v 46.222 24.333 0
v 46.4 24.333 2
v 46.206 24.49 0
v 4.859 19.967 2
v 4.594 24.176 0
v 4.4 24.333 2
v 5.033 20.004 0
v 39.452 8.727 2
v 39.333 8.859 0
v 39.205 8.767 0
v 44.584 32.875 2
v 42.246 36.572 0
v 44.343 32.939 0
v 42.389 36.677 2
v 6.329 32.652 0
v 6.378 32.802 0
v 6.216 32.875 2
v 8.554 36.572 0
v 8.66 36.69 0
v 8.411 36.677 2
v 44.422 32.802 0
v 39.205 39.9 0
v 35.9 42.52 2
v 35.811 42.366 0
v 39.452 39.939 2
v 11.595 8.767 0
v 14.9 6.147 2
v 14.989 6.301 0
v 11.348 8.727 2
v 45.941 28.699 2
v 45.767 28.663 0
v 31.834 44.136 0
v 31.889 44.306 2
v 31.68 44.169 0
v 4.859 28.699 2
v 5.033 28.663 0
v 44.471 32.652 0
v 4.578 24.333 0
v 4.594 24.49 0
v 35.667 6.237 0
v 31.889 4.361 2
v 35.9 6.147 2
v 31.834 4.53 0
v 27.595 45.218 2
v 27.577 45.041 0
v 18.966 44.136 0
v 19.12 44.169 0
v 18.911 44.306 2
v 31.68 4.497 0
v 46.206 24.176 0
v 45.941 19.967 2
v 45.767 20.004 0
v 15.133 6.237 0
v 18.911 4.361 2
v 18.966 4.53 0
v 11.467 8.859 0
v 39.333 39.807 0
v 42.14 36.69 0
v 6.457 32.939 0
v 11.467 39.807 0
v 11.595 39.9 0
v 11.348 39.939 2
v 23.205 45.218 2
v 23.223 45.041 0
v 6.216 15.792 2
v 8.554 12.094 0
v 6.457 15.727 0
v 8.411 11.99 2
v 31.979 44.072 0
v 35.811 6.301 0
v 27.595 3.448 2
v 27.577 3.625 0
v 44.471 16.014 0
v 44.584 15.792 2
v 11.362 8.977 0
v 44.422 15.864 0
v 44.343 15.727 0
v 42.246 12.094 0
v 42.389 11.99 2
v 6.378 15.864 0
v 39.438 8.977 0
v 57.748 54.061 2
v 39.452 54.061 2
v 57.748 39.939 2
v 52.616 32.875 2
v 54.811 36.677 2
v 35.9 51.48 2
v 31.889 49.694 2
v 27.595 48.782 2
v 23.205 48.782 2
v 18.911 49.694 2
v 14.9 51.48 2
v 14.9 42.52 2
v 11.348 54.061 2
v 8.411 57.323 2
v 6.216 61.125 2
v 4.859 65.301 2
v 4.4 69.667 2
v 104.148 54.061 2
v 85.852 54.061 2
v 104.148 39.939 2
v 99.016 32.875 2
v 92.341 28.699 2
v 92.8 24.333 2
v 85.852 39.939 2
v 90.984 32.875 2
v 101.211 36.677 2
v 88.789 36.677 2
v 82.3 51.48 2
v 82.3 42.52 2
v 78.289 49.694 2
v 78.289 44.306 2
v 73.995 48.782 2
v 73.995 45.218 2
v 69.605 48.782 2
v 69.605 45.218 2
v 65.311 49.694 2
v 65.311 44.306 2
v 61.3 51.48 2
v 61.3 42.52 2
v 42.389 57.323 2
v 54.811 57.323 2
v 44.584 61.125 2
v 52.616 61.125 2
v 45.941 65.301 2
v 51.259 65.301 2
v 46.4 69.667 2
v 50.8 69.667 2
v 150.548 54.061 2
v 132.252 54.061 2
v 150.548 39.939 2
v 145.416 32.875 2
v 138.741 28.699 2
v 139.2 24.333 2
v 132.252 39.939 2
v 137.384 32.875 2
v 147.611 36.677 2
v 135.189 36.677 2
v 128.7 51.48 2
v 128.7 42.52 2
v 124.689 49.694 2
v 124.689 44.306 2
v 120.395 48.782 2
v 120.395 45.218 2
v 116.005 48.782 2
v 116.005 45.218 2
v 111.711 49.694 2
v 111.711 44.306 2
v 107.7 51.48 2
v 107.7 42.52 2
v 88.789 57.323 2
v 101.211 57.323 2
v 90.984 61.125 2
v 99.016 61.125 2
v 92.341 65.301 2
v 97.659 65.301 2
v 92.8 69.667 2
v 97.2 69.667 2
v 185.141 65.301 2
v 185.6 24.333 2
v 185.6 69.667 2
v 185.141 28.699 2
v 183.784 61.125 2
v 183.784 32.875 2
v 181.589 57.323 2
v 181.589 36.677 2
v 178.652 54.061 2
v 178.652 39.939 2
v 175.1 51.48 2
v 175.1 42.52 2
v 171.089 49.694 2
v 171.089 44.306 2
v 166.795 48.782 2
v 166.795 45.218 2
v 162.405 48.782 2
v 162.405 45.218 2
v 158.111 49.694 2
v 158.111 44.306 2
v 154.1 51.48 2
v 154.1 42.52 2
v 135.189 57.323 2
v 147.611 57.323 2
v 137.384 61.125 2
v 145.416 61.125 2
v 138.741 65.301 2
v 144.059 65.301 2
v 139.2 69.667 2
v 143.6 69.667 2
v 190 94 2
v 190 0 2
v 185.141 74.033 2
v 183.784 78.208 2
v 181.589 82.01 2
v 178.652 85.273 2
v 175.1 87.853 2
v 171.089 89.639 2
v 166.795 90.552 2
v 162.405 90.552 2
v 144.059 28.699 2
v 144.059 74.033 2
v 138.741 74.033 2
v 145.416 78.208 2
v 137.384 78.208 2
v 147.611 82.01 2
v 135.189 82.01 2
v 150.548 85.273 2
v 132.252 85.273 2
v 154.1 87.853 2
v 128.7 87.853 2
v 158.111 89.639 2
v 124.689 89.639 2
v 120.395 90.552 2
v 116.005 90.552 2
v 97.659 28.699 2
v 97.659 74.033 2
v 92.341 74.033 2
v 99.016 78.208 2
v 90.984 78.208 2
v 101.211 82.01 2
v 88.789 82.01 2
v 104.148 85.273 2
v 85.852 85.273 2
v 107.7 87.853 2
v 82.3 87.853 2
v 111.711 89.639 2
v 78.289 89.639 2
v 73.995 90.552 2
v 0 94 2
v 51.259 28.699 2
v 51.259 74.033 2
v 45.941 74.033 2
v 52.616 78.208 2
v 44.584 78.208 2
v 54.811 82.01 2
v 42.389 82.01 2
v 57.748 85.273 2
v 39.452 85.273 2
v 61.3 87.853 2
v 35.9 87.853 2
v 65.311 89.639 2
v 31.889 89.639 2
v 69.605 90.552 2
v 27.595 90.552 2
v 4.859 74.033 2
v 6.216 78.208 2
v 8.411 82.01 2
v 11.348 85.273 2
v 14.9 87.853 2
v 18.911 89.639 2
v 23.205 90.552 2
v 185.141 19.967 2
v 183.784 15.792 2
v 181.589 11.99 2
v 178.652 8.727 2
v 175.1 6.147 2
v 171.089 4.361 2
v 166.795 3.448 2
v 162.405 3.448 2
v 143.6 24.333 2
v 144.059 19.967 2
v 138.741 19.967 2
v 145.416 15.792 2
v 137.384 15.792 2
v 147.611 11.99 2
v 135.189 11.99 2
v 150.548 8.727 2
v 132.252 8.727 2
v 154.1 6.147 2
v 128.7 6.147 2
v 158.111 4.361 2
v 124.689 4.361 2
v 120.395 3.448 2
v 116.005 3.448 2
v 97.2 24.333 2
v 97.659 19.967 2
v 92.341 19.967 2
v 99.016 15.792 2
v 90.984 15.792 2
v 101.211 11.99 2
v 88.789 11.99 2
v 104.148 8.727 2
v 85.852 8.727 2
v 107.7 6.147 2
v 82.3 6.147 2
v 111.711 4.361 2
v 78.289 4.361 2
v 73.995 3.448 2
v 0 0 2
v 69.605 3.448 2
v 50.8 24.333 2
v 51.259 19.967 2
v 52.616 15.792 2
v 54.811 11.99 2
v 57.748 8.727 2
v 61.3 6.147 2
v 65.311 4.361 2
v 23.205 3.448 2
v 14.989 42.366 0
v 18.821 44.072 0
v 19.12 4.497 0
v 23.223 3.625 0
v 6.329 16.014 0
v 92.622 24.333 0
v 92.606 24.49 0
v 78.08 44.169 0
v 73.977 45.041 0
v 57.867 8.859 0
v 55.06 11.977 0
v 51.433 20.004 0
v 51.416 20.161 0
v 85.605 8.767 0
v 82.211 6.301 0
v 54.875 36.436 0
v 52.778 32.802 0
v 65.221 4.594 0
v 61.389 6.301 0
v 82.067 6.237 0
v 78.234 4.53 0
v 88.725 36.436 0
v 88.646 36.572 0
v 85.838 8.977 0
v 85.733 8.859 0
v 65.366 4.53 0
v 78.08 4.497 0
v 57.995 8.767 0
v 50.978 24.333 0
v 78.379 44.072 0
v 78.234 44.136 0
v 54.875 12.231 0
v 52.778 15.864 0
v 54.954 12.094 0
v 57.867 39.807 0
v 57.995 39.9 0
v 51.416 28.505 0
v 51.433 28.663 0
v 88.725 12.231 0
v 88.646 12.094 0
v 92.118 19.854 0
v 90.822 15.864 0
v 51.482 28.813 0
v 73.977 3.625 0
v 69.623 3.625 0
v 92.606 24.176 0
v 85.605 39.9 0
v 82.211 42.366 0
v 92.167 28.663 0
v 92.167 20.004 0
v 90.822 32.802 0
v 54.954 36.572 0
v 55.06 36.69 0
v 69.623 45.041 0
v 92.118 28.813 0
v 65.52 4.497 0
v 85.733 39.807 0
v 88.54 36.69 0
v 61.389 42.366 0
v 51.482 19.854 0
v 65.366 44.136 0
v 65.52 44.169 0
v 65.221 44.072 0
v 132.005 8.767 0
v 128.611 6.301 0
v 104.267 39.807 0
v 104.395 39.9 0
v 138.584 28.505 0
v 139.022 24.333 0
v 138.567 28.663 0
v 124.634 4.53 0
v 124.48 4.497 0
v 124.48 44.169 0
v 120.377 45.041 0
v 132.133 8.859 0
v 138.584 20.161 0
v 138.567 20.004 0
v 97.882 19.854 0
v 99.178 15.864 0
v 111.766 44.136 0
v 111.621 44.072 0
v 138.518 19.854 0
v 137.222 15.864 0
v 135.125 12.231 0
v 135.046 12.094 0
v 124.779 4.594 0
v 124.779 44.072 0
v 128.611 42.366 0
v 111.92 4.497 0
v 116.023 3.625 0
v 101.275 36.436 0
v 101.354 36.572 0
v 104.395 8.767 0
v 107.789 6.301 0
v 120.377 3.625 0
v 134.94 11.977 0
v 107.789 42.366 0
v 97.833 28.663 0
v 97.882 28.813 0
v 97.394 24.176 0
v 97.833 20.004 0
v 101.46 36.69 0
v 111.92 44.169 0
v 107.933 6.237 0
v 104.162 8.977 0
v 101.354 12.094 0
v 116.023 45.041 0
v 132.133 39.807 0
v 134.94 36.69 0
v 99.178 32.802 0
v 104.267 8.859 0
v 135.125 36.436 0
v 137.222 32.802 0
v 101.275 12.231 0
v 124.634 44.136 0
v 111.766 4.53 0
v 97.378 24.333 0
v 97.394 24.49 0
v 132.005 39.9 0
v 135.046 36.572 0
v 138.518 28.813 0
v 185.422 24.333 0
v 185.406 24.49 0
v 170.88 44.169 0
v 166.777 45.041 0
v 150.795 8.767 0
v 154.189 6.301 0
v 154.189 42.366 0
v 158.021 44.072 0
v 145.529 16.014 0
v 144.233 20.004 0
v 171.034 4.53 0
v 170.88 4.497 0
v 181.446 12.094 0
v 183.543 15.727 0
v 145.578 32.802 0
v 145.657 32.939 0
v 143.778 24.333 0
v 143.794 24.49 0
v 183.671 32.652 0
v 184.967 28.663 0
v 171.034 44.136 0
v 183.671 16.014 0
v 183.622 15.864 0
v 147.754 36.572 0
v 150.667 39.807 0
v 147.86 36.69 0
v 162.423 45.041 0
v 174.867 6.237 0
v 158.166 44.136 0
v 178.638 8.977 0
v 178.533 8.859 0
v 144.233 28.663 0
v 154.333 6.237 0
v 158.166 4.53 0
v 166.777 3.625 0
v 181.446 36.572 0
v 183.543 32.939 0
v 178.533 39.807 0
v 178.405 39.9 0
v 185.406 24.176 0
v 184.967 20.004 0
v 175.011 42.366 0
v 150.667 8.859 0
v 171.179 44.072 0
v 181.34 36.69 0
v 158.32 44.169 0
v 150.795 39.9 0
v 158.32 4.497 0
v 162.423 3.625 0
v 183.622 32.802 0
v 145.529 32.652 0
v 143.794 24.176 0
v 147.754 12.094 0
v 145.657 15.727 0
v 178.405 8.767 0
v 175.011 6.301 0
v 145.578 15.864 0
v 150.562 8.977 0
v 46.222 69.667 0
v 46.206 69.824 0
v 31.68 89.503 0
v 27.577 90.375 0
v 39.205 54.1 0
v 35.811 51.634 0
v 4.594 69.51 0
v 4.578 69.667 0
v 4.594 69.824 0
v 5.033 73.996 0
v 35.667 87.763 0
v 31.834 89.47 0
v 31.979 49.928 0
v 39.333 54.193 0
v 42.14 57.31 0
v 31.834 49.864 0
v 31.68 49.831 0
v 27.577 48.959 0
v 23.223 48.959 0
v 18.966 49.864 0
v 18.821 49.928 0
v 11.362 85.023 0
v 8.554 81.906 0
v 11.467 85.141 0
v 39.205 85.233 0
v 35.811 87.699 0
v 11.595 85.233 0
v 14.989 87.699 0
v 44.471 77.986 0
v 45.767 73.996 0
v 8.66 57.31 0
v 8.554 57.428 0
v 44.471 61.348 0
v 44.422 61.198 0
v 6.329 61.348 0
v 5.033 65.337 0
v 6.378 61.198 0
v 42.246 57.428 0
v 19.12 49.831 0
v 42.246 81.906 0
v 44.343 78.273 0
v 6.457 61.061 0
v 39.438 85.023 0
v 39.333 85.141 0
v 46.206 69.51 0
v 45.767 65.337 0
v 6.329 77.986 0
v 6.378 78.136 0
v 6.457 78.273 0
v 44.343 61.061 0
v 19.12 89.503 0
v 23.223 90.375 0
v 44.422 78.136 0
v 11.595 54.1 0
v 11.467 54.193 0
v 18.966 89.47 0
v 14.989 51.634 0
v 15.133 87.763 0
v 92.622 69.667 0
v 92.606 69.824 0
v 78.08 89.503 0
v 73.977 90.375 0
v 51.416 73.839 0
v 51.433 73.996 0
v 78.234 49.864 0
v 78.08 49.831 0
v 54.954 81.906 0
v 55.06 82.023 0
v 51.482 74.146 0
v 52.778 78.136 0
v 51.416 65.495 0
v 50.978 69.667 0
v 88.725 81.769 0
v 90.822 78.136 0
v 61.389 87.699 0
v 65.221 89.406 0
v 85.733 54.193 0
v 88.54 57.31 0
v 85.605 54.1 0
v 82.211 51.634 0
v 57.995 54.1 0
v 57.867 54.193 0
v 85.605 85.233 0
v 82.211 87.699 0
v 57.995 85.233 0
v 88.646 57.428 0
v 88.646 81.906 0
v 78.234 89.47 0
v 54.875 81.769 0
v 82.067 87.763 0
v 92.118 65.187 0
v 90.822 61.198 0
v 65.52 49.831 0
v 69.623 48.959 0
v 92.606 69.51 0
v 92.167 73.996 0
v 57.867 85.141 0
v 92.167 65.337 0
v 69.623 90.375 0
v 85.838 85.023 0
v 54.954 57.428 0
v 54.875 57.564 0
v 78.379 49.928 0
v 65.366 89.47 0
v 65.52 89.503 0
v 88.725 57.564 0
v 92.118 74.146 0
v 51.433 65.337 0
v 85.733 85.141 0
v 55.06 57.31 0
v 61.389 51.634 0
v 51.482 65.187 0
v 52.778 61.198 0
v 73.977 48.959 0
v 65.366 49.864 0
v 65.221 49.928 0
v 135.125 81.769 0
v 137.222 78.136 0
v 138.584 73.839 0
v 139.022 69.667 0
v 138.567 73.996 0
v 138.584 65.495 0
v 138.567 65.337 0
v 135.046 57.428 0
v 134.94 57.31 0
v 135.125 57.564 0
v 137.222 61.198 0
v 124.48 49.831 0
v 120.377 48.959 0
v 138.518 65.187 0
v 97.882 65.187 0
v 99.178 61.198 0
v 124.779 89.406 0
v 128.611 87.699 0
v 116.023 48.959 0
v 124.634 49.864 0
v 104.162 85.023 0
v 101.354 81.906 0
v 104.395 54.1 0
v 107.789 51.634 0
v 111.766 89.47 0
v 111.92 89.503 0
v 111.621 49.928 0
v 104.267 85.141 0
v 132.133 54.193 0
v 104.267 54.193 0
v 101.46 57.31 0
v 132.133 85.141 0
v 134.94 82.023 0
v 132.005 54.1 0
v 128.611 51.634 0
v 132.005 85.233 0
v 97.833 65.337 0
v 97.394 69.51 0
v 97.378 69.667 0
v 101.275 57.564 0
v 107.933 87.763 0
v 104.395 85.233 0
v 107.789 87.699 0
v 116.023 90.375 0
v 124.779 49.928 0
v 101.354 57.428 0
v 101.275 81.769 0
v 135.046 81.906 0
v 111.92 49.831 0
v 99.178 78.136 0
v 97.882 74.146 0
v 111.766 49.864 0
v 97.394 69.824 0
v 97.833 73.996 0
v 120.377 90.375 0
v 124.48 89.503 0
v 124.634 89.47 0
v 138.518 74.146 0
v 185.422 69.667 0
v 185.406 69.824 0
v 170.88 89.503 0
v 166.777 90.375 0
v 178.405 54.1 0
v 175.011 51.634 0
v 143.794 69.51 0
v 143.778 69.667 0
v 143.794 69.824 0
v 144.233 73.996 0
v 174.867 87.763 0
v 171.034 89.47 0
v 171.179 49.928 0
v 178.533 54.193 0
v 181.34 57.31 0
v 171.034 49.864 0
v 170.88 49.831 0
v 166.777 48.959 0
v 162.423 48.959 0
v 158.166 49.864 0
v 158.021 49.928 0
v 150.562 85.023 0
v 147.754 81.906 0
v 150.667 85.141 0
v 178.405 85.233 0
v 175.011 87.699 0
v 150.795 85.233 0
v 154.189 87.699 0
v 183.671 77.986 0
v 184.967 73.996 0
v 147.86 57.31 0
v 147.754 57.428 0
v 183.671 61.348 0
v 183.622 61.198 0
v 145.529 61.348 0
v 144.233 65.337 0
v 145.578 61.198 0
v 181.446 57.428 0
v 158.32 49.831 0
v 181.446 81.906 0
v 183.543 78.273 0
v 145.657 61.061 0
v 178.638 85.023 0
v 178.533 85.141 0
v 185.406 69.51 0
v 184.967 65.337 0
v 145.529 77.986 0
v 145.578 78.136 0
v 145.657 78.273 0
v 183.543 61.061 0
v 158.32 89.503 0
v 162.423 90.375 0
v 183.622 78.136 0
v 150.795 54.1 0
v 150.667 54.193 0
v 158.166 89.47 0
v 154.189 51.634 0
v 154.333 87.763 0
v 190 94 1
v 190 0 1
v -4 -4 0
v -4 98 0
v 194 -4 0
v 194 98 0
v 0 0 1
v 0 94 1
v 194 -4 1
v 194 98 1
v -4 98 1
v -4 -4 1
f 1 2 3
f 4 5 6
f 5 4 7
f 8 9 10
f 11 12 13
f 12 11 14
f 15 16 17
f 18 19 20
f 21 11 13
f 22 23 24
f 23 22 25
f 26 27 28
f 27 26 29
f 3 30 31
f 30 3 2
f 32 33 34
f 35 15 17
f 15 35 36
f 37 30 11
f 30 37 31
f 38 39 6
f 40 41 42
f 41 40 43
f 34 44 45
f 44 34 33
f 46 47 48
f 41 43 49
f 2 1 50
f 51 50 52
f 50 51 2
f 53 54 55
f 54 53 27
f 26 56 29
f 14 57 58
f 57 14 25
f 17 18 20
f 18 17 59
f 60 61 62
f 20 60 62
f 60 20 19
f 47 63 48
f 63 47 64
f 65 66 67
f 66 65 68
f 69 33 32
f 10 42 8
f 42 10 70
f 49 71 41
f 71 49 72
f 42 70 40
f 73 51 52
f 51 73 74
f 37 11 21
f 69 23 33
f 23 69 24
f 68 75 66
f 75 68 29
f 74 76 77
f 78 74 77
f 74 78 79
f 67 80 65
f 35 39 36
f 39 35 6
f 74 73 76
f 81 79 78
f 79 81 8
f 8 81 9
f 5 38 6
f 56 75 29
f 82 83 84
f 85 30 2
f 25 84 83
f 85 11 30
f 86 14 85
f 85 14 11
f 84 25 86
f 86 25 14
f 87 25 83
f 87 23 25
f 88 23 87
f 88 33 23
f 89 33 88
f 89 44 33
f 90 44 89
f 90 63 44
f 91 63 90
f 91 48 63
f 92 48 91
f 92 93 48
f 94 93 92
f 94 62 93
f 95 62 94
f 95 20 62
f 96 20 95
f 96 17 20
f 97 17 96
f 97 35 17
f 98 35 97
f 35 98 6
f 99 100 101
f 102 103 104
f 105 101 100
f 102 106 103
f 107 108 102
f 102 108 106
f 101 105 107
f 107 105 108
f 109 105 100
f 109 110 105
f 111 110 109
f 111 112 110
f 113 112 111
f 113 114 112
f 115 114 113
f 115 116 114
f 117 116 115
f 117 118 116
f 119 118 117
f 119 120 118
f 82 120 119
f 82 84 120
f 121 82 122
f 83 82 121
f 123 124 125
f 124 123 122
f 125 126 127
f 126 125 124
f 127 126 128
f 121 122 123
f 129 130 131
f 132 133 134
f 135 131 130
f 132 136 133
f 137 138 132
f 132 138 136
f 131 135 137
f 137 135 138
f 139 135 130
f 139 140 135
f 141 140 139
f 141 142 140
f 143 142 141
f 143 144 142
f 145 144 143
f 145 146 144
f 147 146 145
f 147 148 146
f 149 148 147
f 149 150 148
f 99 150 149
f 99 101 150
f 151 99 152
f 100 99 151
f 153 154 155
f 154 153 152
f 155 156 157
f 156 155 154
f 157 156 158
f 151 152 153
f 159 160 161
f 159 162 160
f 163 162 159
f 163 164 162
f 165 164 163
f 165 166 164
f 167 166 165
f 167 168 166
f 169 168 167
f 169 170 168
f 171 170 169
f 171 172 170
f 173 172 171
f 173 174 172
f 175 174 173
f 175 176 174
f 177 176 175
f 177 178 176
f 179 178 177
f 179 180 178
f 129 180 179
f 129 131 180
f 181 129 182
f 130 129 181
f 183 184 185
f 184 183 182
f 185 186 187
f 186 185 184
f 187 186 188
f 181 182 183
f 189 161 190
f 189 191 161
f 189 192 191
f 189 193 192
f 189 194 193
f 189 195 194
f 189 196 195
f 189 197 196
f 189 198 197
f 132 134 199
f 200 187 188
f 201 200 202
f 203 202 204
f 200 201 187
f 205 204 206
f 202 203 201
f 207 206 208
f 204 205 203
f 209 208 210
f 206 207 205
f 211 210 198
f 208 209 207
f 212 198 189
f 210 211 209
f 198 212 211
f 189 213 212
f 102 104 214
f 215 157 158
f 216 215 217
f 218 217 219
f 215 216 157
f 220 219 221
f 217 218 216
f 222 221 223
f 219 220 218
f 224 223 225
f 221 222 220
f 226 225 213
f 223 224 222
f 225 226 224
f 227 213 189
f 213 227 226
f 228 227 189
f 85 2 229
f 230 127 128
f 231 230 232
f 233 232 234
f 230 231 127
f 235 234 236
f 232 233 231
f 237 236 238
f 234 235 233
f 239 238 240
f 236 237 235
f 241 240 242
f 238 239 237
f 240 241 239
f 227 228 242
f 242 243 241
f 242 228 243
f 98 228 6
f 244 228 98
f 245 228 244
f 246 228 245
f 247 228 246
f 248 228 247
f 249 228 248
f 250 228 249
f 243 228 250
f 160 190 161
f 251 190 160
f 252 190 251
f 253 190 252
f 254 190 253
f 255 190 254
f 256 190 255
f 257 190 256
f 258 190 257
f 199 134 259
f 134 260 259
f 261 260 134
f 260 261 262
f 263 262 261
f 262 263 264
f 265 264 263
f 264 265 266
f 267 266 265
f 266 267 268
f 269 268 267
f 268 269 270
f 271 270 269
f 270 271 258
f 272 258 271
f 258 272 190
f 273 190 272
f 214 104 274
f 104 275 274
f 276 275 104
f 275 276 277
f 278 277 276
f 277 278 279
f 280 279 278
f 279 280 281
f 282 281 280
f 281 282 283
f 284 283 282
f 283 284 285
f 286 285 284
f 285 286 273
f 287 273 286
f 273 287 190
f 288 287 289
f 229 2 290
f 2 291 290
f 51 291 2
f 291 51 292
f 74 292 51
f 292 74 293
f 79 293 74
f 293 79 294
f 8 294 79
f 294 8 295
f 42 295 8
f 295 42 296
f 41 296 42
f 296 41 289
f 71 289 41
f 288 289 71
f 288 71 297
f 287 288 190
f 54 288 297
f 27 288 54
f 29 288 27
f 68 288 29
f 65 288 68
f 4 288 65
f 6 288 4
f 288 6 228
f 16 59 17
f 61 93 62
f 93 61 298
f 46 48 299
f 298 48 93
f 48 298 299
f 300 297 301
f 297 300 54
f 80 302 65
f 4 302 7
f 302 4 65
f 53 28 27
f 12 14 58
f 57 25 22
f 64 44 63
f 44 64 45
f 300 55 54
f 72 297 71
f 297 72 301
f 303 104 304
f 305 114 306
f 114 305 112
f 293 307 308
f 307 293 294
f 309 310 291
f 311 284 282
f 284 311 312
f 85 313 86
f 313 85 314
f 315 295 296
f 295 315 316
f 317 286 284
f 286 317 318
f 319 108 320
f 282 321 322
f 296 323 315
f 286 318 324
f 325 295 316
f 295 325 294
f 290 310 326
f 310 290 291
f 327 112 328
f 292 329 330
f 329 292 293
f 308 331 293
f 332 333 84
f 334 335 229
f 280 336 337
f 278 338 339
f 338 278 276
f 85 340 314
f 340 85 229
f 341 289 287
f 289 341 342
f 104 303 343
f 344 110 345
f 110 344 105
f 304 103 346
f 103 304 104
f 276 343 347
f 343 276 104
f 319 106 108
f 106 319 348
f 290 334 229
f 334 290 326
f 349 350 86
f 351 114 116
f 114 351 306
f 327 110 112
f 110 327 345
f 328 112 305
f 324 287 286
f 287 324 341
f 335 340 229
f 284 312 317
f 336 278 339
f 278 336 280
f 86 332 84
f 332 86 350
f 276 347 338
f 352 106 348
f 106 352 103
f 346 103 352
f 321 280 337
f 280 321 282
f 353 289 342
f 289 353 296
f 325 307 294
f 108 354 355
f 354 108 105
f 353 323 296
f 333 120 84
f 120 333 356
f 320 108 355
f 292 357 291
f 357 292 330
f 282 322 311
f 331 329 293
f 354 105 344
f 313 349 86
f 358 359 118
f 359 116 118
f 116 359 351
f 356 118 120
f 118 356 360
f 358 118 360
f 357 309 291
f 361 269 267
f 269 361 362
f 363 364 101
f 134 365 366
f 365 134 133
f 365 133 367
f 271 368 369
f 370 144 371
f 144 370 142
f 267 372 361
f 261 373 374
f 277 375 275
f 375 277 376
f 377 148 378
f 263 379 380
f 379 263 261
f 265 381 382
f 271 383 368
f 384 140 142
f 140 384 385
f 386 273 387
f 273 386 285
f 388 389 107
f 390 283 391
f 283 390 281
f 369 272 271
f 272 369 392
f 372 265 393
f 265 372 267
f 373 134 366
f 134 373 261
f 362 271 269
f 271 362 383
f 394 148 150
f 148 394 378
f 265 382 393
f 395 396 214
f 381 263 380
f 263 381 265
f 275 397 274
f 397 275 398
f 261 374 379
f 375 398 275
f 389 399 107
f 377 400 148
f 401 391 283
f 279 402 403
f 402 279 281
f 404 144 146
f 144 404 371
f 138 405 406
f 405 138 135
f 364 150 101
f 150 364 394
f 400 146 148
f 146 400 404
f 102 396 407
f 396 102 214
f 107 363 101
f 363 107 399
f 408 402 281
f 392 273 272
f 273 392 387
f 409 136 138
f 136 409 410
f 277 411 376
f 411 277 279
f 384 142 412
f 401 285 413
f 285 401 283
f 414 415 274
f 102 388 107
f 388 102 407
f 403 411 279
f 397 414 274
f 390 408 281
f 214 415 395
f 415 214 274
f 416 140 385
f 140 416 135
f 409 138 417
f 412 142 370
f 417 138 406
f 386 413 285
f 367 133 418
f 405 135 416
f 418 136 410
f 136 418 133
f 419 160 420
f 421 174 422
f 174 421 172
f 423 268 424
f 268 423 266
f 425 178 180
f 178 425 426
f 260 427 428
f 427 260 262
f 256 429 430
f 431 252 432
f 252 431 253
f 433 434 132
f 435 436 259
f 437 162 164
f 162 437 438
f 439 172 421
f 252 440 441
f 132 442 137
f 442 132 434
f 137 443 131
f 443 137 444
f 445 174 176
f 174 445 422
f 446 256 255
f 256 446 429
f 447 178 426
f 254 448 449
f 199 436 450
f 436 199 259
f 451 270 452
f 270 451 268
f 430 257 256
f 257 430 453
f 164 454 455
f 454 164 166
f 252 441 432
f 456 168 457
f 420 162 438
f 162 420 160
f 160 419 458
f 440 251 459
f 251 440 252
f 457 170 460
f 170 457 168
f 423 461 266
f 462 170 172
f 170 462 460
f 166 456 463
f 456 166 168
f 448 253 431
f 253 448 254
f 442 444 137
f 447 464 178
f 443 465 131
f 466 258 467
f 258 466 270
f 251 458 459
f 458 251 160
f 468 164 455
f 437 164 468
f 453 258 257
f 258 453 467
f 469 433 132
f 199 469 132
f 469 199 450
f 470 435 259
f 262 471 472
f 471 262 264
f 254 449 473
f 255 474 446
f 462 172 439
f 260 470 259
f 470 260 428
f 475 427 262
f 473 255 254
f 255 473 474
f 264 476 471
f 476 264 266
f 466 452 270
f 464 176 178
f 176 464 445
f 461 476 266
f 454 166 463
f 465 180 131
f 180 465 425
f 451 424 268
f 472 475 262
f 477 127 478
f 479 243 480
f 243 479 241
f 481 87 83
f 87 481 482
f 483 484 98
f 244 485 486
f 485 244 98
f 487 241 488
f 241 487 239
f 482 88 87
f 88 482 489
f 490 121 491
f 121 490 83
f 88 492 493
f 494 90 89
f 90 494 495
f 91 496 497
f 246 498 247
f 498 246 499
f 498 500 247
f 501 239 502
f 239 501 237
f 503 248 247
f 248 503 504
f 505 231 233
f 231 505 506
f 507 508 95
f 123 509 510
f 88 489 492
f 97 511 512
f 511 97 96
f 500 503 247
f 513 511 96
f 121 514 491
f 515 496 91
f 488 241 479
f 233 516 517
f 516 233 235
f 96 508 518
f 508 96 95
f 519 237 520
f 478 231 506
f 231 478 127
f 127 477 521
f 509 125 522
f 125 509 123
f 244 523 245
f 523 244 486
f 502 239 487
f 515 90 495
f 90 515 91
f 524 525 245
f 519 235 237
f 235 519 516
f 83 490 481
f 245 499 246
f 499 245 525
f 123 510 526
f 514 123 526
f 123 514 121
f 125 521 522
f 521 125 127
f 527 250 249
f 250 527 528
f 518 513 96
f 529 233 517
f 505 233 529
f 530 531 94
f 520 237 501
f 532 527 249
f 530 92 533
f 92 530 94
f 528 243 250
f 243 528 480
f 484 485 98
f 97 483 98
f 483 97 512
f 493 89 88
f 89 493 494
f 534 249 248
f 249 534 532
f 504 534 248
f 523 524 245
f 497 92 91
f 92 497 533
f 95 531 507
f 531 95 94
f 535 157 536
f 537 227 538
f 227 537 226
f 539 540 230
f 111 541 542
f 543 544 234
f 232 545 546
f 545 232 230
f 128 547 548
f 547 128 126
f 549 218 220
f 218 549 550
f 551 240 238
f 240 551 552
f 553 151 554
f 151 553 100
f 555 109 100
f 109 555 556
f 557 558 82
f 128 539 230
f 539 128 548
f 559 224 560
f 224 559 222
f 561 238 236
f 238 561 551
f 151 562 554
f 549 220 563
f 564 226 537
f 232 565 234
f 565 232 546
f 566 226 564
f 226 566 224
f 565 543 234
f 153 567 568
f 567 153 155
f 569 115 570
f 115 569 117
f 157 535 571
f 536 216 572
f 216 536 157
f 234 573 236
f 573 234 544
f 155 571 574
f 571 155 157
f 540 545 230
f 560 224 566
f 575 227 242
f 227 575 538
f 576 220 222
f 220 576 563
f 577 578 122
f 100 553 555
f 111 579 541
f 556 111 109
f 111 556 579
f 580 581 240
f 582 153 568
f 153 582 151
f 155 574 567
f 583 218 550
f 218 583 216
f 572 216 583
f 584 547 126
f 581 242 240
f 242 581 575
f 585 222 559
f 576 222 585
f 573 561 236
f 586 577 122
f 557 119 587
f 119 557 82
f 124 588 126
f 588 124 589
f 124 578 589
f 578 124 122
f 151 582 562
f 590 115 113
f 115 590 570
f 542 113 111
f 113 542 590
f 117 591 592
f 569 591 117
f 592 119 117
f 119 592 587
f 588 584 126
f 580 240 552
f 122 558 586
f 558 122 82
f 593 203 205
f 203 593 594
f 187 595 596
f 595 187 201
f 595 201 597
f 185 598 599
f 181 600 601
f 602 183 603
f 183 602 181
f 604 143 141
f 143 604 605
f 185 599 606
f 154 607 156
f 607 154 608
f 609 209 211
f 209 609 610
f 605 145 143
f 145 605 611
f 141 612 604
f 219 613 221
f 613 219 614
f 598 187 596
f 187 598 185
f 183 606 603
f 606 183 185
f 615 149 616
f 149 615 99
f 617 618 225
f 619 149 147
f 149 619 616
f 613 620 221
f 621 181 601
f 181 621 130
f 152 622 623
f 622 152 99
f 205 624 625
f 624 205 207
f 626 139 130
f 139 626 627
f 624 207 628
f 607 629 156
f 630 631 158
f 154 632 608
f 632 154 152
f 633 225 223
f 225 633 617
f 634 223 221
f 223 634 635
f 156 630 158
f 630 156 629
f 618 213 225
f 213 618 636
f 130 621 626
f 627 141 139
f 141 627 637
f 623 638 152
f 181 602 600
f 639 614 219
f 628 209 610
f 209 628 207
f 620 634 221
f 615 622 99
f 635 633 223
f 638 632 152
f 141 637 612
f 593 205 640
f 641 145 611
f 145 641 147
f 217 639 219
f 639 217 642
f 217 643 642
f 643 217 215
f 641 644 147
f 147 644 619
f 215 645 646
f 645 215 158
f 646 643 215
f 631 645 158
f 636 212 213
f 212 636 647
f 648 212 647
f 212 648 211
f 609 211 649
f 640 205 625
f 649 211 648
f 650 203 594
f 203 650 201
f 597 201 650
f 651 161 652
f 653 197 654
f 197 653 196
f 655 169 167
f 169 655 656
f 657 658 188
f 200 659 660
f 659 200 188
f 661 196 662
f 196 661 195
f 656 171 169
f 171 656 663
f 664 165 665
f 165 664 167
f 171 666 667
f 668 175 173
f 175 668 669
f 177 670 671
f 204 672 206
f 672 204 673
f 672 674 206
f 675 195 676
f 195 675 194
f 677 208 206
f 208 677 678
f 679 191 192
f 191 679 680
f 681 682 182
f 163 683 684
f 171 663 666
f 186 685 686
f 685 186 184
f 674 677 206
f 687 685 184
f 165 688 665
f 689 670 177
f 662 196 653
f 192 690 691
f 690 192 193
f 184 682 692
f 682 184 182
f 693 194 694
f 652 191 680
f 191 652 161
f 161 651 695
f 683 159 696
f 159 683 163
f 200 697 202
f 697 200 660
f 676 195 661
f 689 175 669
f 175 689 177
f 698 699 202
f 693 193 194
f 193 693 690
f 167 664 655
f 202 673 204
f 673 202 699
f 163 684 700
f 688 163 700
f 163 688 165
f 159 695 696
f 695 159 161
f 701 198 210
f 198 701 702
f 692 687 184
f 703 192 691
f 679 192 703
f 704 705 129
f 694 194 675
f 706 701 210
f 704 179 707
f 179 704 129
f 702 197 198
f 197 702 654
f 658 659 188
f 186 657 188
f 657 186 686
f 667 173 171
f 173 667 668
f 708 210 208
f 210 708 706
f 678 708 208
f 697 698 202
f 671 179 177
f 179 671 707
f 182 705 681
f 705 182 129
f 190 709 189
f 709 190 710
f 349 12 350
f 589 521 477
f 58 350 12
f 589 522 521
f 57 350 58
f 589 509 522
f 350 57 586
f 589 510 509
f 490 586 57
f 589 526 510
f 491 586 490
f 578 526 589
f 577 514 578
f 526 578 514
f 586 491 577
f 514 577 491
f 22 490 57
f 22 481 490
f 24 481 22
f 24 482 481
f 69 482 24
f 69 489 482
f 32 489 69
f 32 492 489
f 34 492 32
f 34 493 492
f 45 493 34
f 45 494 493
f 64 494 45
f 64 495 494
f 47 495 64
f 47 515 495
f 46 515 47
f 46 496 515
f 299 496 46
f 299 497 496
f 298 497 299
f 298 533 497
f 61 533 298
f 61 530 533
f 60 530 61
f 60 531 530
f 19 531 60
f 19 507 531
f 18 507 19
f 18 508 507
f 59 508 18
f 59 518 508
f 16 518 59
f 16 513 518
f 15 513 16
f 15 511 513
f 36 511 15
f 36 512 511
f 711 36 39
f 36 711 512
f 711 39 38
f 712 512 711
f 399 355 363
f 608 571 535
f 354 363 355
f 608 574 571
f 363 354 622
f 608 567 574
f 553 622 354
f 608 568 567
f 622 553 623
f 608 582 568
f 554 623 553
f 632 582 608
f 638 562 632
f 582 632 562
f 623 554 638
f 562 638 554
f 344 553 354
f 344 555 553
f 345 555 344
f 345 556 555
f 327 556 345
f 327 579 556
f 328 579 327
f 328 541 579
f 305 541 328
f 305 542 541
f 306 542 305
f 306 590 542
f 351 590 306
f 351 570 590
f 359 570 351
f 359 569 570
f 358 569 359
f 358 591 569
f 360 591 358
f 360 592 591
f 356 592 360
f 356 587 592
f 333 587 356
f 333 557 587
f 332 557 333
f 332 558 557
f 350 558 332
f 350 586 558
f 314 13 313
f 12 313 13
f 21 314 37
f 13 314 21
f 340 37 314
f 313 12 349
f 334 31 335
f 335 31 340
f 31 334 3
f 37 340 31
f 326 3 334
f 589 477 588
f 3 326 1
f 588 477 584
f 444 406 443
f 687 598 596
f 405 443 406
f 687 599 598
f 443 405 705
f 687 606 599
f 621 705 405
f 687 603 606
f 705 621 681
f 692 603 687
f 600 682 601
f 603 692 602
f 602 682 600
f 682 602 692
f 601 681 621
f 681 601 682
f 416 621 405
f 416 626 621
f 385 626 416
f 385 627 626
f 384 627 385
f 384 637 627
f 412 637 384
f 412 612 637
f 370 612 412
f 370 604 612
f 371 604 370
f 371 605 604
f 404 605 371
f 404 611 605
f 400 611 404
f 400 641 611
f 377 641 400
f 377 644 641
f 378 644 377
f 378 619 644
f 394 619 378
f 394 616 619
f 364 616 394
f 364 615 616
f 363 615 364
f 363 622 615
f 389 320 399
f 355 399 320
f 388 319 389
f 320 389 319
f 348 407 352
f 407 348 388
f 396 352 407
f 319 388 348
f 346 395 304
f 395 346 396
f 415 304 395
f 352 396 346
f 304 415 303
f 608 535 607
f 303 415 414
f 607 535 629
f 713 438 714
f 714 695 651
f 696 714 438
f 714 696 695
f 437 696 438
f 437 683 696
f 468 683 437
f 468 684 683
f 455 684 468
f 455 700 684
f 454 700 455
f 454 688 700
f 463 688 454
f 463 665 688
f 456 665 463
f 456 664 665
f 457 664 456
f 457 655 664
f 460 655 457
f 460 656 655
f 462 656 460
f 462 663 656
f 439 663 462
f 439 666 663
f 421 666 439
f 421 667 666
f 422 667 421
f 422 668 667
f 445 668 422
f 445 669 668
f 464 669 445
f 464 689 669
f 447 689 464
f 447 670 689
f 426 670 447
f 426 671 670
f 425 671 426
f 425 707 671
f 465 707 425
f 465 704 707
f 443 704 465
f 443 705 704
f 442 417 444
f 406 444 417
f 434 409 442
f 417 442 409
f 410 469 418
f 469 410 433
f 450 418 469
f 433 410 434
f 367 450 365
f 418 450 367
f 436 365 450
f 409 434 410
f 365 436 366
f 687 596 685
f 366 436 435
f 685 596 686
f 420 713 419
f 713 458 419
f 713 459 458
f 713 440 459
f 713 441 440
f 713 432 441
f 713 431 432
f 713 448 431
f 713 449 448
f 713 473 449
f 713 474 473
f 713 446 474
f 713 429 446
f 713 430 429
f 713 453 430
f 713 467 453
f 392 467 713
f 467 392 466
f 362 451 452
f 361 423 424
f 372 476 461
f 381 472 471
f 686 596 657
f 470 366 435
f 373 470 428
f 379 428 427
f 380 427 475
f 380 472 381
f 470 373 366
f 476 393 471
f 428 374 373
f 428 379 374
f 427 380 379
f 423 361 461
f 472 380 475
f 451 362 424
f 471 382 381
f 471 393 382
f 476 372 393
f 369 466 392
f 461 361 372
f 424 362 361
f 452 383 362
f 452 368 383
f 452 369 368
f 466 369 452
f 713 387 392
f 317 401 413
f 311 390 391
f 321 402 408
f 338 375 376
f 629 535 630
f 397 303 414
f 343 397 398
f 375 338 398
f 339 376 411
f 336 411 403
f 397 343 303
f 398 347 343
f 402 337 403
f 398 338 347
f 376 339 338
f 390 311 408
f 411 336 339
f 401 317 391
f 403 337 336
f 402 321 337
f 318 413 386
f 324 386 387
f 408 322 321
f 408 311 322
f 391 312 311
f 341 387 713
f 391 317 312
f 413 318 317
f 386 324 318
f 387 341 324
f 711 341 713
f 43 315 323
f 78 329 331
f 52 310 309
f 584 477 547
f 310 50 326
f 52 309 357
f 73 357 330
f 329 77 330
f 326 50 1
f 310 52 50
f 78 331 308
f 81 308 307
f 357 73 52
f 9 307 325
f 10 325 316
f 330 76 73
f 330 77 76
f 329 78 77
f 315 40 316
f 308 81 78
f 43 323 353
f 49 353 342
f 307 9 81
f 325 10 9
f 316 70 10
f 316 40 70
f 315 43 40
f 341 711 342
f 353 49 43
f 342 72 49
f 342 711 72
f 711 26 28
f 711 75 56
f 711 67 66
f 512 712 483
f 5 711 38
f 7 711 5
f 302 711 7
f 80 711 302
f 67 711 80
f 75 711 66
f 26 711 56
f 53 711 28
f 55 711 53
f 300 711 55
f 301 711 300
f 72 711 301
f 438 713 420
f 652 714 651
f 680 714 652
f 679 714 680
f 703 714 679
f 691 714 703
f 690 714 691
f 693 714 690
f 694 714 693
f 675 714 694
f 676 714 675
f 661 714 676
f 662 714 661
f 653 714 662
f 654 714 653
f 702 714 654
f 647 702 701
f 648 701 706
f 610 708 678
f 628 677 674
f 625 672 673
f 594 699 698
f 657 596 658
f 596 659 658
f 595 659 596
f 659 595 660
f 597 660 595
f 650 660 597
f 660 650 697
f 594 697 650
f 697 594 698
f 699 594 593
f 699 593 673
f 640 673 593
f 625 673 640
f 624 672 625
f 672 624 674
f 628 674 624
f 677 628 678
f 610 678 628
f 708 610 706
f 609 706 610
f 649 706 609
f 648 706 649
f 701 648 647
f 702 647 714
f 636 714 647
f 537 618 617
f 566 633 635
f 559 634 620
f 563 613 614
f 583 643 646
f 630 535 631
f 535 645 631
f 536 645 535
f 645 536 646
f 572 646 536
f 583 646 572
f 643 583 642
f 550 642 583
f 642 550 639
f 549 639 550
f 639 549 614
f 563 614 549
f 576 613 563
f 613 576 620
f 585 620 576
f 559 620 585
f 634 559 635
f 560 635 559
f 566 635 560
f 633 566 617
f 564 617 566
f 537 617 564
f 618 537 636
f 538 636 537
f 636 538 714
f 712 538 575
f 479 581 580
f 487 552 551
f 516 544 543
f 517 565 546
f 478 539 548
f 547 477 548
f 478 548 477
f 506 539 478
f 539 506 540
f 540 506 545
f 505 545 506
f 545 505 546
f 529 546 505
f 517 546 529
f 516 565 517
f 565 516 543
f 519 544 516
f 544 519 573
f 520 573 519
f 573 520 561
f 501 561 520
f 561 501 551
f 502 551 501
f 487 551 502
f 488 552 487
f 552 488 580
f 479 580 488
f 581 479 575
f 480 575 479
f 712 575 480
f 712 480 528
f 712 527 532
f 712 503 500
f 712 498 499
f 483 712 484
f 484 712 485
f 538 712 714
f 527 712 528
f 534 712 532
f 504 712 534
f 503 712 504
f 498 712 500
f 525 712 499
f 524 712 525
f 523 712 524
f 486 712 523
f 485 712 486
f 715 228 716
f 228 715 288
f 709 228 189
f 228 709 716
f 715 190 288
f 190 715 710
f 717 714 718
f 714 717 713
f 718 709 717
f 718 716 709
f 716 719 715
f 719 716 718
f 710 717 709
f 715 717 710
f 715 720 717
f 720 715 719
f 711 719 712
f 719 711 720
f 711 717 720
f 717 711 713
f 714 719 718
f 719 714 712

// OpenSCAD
plate_width = 190;
plate_length = 94;
plate_height = 2;

plate_border = 4;
plate_border_height = 1;

cup_upper_diameter = 40;
cup_lower_diameter = 32;
cup_cutout_diameter = 17;
cup_height = 45;
cup_thickness = 2;
cup_rim_height = 2;
cup_rim_thickness = 1;

draw_plate();
//draw_cup();


module draw_plate() {
    rows = 2;
    cols = 4;
    x_spacing = (plate_width - cols * (cup_upper_diameter + cup_thickness)) / (cols + 1);
    y_spacing = (plate_length - rows * (cup_upper_diameter + cup_thickness)) / (rows + 1);
    difference() {
        cube([plate_width, plate_length, plate_height], false);
                
        for(row = [1:rows]) {
            for(col = [1:cols]) {
                x_offset = (cup_upper_diameter + cup_thickness + x_spacing) * col - (cup_upper_diameter + cup_thickness) / 2;
                y_offset = (cup_upper_diameter + cup_thickness + y_spacing) * row - (cup_upper_diameter + cup_thickness) / 2;
                
                translate([x_offset, y_offset, -cup_height + plate_height])
                    cylinder(d1 = cup_lower_diameter + cup_thickness, d2 = cup_upper_diameter + cup_thickness, h = cup_height);
            }
        }
        
    }
    
    // Draw border: B, T, L, R
    translate([-plate_border, -plate_border, 0])
        cube([plate_width + 2 * plate_border, plate_border, plate_border_height]);
    translate([-plate_border, plate_length, 0])
        cube([plate_width + 2 * plate_border, plate_border, plate_border_height]);
    translate([-plate_border, -plate_border, 0])
        cube([plate_border, plate_length + 2 * plate_border, plate_border_height]);
    translate([plate_width, -plate_border, 0])
        cube([plate_border, plate_length + 2 * plate_border, plate_border_height]);
}

module draw_cup() {
    difference() {
        cylinder(d1 = cup_lower_diameter + cup_thickness, d2 = cup_upper_diameter + cup_thickness, h = cup_height);
        cylinder(d1 = cup_lower_diameter, d2 = cup_upper_diameter, h = cup_height);
    }
    
    slope=(cup_upper_diameter-cup_lower_diameter)/(cup_height - 0); //m = (y2-y1)/(x2-x1)
    difference() {
        cylinder(d1 = cup_lower_diameter, d2 = cup_lower_diameter + slope * cup_thickness, h = cup_thickness);
        cylinder(d = cup_cutout_diameter, h = cup_thickness);
    }
    translate([0, 0, cup_height])
        difference() {
            cylinder(d1 = cup_upper_diameter + cup_thickness, d2 = cup_upper_diameter + cup_thickness + 2 * cup_rim_thickness, h = cup_rim_height);
            cylinder(d1 = cup_upper_diameter, d2 = cup_upper_diameter + slope * cup_rim_height, h = cup_rim_height);
        }
}
